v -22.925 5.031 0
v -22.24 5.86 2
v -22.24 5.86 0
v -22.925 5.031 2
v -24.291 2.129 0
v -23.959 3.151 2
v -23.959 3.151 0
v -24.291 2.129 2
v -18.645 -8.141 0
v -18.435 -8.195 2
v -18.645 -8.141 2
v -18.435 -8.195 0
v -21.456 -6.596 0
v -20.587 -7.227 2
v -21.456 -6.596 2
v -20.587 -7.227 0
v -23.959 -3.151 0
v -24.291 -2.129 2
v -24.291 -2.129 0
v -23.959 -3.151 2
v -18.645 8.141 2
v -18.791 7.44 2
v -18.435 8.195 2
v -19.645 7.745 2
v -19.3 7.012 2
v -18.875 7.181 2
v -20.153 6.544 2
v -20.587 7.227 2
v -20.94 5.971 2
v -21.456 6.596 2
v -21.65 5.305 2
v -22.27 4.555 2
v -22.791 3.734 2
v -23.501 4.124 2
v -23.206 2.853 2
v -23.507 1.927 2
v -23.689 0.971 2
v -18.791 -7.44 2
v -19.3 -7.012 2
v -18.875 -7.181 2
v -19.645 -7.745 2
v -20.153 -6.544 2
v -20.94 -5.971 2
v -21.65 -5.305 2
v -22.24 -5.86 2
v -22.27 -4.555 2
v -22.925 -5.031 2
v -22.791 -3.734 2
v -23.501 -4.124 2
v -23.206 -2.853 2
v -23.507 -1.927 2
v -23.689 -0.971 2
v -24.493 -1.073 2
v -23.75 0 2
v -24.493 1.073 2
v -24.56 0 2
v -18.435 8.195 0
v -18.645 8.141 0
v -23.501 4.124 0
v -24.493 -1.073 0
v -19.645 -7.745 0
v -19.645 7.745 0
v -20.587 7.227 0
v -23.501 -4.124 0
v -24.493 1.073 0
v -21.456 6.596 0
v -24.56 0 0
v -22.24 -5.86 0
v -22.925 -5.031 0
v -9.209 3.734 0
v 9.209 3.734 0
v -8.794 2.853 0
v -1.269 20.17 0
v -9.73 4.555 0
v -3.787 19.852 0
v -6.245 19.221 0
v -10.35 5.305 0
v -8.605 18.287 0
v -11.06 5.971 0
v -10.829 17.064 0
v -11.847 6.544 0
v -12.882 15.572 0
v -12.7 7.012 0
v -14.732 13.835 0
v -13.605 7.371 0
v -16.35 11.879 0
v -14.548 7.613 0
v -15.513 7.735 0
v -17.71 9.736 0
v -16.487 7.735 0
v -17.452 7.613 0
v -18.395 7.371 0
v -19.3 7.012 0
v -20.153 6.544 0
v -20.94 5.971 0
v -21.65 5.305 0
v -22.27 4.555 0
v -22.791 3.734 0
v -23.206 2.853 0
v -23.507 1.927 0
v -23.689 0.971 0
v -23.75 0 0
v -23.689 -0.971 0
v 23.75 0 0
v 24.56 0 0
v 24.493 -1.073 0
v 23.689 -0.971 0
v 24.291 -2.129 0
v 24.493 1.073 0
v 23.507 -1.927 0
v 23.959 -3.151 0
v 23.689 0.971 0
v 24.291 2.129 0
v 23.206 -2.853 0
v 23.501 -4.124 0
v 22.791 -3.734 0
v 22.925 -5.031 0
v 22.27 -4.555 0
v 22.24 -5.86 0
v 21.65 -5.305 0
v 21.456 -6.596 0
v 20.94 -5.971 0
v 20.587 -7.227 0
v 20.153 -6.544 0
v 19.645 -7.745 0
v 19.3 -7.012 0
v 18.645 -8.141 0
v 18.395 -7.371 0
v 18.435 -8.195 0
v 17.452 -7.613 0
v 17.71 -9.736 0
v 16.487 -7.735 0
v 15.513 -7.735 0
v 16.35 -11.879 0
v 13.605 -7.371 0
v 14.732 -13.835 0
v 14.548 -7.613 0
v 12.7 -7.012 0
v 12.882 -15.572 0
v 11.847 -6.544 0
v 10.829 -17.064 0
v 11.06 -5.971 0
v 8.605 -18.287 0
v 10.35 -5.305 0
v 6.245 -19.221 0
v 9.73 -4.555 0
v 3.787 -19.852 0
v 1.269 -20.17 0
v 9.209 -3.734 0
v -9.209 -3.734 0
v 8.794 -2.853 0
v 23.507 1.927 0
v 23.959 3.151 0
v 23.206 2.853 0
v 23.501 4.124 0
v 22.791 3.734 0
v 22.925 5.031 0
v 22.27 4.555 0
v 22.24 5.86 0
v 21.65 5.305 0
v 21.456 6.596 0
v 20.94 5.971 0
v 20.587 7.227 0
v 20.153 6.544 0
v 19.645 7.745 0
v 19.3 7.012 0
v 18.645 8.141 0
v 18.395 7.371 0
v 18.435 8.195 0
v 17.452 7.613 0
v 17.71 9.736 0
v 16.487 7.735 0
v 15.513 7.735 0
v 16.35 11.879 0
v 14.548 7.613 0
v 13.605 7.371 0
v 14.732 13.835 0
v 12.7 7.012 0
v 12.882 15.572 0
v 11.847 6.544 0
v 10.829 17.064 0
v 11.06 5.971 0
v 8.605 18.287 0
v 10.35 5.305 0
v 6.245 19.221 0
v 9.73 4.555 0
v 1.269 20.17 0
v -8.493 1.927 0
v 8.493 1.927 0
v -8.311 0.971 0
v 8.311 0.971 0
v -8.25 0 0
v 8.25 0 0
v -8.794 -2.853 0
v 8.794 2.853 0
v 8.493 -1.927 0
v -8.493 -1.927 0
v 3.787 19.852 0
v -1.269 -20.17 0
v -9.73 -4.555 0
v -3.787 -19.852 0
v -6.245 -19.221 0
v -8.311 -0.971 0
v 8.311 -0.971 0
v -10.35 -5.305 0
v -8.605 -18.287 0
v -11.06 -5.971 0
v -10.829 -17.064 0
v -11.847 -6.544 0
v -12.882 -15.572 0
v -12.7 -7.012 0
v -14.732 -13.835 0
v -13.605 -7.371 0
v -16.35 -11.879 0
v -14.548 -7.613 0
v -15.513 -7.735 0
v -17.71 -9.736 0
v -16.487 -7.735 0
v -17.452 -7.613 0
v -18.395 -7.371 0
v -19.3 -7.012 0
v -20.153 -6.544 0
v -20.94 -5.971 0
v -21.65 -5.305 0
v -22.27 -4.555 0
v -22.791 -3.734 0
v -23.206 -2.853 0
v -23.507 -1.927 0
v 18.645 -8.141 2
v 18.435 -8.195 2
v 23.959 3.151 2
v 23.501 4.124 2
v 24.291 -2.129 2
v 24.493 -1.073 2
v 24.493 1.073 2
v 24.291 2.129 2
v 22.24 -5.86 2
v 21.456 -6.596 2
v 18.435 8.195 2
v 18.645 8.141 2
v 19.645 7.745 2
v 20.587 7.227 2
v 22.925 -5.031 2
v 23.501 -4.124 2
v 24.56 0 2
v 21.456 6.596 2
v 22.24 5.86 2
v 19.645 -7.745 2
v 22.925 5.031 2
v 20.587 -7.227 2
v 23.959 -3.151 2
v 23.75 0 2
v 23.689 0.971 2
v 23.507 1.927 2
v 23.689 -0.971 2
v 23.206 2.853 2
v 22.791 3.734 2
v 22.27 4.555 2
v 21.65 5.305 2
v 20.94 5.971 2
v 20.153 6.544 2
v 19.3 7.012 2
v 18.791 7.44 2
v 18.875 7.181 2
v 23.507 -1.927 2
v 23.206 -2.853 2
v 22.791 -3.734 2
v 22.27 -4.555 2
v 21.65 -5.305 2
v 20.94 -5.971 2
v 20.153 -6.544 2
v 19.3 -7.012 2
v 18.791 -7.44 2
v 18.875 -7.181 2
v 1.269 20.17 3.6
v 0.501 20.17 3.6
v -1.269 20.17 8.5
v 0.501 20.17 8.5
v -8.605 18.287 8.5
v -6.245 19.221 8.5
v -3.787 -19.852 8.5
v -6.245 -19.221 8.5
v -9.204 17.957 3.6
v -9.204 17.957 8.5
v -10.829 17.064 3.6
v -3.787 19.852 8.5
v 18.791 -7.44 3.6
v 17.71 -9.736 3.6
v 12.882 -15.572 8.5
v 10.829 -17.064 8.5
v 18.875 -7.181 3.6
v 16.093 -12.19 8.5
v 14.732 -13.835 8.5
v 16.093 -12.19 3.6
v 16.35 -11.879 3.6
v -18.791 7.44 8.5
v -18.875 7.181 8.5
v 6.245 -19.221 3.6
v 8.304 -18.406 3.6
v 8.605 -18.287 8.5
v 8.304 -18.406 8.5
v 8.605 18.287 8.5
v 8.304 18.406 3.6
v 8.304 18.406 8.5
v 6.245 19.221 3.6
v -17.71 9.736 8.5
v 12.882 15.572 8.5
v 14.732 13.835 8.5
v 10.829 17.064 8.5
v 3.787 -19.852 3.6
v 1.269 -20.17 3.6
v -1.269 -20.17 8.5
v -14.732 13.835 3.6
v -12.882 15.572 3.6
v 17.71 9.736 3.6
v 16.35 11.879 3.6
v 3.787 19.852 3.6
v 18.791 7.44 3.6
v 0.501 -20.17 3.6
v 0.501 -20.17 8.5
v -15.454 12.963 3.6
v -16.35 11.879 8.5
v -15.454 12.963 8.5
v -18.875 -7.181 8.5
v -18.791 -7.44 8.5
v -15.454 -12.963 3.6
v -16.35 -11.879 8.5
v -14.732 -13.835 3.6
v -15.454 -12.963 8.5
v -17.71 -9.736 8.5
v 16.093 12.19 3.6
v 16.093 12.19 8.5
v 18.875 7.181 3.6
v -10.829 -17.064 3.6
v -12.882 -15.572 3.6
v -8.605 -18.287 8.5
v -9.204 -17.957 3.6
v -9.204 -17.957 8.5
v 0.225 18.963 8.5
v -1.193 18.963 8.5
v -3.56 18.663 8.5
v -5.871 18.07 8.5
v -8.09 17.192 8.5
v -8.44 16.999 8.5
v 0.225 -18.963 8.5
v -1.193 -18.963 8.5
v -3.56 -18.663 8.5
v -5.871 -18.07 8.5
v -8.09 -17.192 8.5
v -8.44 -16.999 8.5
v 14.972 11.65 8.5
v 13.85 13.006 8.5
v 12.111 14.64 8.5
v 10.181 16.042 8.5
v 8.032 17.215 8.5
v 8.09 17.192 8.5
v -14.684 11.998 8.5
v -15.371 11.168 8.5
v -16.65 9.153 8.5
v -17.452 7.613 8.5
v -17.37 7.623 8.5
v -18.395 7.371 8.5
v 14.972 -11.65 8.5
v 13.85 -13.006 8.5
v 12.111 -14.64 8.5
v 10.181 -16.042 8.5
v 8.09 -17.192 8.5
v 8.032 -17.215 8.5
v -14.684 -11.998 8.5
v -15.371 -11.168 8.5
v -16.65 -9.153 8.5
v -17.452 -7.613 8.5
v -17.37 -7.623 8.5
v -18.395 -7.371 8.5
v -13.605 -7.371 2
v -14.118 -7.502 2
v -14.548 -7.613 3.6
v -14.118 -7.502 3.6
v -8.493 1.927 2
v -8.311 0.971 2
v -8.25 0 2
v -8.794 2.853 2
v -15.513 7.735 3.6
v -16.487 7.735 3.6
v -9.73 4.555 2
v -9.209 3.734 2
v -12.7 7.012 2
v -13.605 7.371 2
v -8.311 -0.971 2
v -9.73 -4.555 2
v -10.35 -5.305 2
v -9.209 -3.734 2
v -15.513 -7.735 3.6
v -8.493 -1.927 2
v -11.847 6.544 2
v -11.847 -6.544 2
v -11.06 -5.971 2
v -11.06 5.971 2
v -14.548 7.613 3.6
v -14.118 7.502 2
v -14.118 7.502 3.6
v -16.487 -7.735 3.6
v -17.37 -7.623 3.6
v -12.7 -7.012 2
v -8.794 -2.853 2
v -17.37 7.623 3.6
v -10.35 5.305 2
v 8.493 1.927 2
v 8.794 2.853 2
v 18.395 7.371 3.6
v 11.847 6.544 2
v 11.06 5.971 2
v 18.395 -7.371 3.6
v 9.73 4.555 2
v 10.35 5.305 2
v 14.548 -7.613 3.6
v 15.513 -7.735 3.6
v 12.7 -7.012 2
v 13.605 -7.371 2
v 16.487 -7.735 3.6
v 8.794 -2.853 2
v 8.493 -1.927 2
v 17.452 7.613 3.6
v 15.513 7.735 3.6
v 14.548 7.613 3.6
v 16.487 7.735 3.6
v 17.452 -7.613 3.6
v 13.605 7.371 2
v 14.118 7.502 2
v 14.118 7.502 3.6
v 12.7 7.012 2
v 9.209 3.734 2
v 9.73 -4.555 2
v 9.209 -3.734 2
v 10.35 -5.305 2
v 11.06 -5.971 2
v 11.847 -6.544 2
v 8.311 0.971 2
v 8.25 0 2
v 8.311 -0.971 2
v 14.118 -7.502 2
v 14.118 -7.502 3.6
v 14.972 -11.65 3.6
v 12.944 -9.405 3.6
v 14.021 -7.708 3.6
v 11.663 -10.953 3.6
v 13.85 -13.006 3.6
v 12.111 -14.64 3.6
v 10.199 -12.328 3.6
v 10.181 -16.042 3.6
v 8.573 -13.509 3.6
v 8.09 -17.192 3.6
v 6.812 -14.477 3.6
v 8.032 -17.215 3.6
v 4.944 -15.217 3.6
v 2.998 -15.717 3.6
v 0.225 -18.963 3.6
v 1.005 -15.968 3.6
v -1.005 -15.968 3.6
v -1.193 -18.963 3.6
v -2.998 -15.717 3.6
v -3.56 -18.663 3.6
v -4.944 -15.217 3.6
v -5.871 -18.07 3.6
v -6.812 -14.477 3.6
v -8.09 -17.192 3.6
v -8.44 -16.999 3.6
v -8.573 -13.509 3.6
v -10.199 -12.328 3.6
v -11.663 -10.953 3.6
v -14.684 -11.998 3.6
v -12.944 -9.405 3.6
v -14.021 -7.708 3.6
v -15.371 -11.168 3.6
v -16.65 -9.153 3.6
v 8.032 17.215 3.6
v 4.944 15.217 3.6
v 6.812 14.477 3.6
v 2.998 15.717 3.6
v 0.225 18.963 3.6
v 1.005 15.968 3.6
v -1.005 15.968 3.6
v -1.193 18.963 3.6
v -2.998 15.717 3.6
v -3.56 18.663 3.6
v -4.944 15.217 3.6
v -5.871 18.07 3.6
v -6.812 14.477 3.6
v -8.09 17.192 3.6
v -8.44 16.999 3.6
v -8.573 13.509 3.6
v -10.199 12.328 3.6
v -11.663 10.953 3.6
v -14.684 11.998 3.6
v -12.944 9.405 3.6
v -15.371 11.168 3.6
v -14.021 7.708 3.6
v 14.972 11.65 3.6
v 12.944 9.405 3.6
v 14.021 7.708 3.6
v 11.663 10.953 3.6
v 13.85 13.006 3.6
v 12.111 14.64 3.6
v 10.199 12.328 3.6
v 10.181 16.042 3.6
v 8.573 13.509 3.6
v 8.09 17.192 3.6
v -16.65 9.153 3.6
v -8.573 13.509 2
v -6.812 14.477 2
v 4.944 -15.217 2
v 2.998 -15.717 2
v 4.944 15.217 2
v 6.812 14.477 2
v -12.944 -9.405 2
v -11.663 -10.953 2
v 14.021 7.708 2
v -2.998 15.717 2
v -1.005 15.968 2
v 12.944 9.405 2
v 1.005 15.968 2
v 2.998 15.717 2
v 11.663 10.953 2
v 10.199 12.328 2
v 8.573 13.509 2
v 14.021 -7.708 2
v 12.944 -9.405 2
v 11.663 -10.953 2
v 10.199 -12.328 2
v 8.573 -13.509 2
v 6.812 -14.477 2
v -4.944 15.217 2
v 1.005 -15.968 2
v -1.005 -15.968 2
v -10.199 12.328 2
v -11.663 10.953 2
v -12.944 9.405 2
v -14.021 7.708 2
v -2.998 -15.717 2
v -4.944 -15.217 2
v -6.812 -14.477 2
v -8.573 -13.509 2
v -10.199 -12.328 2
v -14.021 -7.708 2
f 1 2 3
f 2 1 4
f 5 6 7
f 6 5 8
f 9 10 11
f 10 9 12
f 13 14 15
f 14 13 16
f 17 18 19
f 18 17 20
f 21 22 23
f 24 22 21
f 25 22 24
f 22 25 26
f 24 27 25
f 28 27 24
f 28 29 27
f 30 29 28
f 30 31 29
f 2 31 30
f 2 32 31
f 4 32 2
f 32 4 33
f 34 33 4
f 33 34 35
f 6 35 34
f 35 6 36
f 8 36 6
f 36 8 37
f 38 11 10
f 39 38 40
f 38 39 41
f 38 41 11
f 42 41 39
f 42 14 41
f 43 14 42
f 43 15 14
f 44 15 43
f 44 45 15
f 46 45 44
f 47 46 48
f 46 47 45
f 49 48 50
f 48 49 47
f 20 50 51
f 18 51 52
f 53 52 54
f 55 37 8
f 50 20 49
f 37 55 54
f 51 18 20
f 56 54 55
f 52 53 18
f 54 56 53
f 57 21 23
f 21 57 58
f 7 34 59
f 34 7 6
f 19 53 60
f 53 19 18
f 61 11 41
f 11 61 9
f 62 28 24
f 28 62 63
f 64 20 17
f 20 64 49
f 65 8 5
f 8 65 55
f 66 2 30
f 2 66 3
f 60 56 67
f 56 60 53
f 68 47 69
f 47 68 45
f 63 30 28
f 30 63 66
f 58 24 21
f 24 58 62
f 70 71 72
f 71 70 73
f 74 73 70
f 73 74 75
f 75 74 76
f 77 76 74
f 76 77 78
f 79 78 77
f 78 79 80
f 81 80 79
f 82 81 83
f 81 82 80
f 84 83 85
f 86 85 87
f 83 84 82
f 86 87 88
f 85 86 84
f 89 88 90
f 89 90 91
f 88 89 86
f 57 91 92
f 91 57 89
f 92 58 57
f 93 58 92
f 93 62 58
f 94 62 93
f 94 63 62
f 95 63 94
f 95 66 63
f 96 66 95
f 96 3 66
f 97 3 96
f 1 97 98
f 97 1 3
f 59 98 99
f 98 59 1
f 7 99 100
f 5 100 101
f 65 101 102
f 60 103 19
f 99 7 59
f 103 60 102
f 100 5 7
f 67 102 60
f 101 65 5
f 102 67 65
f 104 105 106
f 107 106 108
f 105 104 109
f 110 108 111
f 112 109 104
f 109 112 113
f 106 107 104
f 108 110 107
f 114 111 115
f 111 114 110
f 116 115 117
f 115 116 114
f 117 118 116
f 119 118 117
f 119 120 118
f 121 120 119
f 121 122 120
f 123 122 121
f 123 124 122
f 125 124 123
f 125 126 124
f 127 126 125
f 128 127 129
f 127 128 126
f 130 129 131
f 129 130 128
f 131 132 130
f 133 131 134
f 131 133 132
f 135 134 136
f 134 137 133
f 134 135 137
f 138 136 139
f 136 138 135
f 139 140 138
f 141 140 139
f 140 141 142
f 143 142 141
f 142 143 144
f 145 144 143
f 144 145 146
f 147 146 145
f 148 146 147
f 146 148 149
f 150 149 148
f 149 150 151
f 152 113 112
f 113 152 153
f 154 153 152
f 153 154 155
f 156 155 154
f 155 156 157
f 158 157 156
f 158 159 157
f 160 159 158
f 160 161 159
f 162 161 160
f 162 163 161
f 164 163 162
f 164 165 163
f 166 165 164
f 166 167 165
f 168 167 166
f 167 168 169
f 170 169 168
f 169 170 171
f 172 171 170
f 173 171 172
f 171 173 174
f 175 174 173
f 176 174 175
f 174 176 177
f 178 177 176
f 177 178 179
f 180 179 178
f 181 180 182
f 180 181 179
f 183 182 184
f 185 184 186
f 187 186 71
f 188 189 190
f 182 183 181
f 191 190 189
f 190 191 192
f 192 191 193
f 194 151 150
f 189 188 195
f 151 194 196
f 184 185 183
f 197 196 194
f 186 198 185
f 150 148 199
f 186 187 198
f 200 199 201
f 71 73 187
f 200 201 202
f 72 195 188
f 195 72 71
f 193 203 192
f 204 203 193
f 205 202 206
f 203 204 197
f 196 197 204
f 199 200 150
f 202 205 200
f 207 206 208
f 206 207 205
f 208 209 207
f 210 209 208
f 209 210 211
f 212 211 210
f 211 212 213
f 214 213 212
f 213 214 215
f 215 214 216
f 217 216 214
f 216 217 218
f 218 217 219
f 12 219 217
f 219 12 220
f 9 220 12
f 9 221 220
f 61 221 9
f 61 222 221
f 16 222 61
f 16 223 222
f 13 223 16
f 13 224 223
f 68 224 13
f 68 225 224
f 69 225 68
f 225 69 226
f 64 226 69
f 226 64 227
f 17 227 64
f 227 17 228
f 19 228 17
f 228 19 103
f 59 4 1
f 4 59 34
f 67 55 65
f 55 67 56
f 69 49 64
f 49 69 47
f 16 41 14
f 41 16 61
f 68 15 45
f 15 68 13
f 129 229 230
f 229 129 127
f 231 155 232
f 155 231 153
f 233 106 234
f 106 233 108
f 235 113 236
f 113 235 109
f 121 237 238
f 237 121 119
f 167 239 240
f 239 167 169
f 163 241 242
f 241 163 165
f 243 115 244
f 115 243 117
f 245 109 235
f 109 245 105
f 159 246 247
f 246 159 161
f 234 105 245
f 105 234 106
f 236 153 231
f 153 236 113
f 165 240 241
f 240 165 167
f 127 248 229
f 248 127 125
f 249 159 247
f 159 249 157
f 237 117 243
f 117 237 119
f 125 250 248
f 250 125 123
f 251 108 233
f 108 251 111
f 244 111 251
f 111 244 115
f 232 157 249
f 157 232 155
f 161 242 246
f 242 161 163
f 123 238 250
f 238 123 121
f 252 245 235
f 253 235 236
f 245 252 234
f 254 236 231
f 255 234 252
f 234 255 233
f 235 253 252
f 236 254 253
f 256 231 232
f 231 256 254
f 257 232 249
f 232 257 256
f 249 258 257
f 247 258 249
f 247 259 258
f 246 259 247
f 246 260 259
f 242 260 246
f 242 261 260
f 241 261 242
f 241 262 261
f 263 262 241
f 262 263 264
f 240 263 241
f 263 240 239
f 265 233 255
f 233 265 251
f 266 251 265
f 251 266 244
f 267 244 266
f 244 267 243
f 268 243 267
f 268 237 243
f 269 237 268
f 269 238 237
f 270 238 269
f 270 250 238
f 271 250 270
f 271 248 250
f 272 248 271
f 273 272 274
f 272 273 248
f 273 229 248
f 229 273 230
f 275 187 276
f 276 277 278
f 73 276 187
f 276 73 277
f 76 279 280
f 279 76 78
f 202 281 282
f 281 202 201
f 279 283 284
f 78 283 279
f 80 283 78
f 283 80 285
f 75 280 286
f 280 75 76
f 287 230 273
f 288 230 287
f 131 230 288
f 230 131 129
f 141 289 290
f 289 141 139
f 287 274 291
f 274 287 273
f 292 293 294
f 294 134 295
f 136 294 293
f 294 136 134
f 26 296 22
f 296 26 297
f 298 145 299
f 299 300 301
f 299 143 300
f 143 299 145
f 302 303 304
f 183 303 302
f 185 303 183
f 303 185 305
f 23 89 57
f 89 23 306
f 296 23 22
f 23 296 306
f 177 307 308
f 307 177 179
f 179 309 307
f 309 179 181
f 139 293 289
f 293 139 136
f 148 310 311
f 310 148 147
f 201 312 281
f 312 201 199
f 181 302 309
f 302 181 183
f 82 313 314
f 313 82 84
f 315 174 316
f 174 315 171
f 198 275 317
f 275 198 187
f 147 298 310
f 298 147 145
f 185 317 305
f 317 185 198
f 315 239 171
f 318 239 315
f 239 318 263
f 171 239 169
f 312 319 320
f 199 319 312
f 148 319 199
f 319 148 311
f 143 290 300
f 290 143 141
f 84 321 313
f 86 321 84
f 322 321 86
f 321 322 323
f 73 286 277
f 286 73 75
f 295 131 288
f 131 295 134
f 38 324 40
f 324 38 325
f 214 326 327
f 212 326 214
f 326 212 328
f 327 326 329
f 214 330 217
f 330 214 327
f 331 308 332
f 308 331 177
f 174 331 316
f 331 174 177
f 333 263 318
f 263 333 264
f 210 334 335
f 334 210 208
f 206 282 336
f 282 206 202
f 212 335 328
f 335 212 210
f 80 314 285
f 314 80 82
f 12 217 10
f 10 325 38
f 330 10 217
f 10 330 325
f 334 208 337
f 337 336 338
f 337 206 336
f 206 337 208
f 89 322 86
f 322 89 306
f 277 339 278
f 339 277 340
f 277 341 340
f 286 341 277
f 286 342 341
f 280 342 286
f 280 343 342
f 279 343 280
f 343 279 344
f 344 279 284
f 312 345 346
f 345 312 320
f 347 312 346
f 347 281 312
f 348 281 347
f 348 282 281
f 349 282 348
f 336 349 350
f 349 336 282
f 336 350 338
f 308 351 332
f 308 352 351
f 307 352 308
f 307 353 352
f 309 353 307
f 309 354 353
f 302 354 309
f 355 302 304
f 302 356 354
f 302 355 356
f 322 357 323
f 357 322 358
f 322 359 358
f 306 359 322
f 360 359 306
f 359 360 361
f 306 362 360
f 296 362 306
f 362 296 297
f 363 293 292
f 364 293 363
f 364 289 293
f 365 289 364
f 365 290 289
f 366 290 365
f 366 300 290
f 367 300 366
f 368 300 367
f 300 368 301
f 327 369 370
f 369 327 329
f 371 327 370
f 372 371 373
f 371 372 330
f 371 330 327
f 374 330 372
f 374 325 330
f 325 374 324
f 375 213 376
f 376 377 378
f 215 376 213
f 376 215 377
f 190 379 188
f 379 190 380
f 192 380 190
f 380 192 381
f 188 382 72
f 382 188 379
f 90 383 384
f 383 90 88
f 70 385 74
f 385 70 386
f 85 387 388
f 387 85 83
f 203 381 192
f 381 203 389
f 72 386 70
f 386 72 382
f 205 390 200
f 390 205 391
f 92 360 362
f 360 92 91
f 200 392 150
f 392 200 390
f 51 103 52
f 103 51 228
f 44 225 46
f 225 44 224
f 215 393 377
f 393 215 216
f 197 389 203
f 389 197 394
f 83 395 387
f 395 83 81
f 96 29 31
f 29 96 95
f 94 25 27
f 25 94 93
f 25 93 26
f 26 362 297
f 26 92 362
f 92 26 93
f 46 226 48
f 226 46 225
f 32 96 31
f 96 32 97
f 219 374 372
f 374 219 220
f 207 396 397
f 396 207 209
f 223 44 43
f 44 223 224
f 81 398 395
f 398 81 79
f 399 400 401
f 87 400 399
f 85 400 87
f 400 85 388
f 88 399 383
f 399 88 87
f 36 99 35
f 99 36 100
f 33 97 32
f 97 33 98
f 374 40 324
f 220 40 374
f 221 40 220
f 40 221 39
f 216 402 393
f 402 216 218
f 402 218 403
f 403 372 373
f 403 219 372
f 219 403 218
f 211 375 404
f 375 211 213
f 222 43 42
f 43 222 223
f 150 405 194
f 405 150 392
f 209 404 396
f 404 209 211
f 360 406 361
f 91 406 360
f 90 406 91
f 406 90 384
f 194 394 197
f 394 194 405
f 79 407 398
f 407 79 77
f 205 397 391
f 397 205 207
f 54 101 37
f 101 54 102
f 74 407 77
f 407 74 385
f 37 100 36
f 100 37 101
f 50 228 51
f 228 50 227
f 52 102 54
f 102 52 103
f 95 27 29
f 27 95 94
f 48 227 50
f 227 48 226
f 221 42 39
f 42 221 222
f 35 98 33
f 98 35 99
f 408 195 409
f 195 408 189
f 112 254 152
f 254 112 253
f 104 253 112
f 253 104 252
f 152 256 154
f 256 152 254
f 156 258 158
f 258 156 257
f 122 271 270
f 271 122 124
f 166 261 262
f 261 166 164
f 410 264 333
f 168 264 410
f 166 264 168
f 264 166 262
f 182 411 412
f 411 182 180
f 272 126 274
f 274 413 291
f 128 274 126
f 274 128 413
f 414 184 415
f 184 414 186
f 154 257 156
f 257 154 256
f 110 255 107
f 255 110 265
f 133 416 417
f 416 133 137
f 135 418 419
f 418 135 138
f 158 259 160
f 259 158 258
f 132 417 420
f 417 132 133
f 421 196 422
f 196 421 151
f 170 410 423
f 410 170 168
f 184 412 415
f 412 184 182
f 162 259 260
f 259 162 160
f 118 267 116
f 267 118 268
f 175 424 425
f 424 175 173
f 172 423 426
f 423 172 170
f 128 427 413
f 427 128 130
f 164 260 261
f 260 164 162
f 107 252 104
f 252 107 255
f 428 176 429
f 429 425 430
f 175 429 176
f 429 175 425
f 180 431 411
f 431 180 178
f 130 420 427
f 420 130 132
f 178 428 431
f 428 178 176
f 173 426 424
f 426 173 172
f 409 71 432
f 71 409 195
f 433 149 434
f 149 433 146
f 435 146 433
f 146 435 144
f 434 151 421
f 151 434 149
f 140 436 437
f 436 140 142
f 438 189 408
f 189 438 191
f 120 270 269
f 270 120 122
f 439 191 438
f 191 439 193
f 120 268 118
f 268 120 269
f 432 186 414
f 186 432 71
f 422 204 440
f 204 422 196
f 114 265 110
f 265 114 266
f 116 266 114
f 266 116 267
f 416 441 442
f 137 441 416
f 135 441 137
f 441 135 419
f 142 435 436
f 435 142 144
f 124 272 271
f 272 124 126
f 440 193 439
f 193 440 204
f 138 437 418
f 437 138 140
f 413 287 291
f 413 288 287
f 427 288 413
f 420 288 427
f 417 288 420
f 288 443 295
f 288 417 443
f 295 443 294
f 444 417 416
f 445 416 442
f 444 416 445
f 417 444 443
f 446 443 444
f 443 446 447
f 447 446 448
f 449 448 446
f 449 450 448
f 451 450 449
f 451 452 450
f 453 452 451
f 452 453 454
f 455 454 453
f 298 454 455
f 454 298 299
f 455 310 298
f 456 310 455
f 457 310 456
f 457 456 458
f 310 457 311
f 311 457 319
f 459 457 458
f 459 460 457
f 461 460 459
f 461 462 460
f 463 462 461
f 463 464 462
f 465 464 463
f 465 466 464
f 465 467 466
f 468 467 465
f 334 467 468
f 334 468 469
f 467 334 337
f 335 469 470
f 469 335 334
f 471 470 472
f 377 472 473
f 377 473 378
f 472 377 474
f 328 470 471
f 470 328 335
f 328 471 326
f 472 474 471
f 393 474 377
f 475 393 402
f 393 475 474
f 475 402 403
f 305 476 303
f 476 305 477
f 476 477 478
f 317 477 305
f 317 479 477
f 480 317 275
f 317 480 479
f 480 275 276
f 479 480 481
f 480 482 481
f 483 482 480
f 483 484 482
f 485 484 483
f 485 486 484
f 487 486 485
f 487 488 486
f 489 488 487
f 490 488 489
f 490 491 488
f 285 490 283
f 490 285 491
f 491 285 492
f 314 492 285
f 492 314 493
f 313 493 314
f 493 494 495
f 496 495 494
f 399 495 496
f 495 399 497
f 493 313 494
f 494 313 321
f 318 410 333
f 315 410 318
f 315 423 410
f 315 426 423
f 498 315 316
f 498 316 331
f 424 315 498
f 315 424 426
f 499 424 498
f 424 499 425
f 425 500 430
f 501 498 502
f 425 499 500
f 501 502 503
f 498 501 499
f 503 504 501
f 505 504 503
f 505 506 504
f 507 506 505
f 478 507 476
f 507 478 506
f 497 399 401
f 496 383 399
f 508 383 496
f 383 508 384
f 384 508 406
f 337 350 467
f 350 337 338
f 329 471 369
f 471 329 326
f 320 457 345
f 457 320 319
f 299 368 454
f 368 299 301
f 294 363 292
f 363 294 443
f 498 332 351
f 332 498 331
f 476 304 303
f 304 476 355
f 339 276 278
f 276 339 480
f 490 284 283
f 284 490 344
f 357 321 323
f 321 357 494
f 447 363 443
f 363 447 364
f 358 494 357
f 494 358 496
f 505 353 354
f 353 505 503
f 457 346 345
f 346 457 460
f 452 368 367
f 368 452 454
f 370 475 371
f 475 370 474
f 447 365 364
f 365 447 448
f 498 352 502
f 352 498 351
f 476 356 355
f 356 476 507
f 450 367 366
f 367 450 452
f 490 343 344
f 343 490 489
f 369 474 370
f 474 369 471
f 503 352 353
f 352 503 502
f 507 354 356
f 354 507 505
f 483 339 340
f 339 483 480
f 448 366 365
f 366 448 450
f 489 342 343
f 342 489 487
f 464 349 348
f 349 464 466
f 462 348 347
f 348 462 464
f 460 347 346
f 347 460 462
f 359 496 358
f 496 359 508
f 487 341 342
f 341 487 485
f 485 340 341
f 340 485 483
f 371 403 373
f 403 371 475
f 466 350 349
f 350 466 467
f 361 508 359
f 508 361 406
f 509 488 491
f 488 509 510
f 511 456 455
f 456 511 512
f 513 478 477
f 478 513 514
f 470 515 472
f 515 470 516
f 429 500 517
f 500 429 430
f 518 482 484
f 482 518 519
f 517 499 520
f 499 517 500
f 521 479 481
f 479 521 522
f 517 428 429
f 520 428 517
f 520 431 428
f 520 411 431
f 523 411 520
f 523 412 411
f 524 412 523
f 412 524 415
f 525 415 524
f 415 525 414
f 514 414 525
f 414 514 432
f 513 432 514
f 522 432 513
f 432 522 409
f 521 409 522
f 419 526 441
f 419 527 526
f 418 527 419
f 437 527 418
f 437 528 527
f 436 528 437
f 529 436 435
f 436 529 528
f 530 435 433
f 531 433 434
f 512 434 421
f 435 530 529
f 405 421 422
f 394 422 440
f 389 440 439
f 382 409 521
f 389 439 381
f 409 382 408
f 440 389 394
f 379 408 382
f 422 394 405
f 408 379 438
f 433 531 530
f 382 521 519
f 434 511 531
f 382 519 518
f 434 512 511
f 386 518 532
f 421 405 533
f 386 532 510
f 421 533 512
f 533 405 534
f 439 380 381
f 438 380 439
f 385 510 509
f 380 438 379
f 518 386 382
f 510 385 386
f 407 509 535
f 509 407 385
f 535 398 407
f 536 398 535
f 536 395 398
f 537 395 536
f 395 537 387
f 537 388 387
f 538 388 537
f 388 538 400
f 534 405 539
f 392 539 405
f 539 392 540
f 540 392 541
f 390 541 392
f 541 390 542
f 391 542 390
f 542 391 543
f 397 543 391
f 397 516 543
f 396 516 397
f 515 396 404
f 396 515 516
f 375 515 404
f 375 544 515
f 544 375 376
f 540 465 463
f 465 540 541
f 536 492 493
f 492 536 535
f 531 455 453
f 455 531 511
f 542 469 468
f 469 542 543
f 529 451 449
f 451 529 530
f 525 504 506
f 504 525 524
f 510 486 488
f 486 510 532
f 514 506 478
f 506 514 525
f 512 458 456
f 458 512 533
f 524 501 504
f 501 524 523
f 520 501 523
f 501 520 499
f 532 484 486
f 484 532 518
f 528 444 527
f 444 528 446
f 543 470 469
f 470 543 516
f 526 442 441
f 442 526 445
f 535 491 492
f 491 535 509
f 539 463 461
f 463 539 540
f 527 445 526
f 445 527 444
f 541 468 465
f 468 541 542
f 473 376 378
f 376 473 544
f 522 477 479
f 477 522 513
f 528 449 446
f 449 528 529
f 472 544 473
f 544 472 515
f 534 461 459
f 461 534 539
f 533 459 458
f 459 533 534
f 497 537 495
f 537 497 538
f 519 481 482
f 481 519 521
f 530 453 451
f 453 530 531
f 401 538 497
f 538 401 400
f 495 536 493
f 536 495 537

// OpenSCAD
// Mount to put spinning magnets onto a PC fan for magnetic stirrer

/* [Magnets] */

// Allow clearance
Magnet_Diameter = 15.5;
// Allow clearance
Magnet_Height = 2;  

// Wall thickness of magnet retainer
Magnet_Wall = 0.81;
//This is two walls with line width of 0.4mm and extra 0.01 is to prevent rounding errors.

/* [Washer] */

Washer_Diameter = 32; //  Generous is OK.
Washer_Height = 1.6; 

/* [Fan] */

// Inner diameter of part that engages with fan
Fan_Diameter = 38; 
// Height of part that engages with fan
Fan_Height = 8.5; 
// Wall thickness of part that engages with fan
Fan_Wall = 1.21; 
// Number of fan blades
Fan_Blades = 7; 
// Width of slot for each blade.
Fan_Slot = 8; 
// Tune to avoid short segments when changing number of blades!
Fan_Fiddle_Factor = 0.75; 	// The 0.75 is a fiddle factor to avoid short segments. If you change number of blades, you may need to fiddle with this.

/* [Hidden] */

$fn = 50;
Tad = 0.1;
Tad2 = Tad*2;

difference () {
	union () {
		// Main body
		cylinder (d=Fan_Diameter+Fan_Wall*2, h=Fan_Height);
		// Mag bodies
		for (x=[-1,1]) translate ([Washer_Diameter/2*x, 0, 0]) cylinder (d=Magnet_Diameter+Magnet_Wall*2, h=Magnet_Height);
	}
	// Remove cylinder for fan
	translate ([0, 0, Magnet_Height+Washer_Height]) cylinder (d=Fan_Diameter, h=Fan_Height);
	// Remove cylinder for washer
	translate ([0, 0, Magnet_Height]) cylinder (d=Washer_Diameter, h=Washer_Height+Tad);
	// Remove mag holes
	for (x=[-1,1]) translate ([Washer_Diameter/2*x, 0, -Tad]) cylinder (d=Magnet_Diameter, h=Fan_Height*2); // Fan_Height*2 just means "go mad, go high".
	// Blade cutouts.

	for (b = [1 : Fan_Blades]) rotate ([0, 0, (b + Fan_Fiddle_Factor) * (360 / Fan_Blades)]) translate ([- Fan_Slot/2, 0, Magnet_Height + Washer_Height]) cube ([Fan_Slot, Fan_Diameter*2, Fan_Height*2]);
}
